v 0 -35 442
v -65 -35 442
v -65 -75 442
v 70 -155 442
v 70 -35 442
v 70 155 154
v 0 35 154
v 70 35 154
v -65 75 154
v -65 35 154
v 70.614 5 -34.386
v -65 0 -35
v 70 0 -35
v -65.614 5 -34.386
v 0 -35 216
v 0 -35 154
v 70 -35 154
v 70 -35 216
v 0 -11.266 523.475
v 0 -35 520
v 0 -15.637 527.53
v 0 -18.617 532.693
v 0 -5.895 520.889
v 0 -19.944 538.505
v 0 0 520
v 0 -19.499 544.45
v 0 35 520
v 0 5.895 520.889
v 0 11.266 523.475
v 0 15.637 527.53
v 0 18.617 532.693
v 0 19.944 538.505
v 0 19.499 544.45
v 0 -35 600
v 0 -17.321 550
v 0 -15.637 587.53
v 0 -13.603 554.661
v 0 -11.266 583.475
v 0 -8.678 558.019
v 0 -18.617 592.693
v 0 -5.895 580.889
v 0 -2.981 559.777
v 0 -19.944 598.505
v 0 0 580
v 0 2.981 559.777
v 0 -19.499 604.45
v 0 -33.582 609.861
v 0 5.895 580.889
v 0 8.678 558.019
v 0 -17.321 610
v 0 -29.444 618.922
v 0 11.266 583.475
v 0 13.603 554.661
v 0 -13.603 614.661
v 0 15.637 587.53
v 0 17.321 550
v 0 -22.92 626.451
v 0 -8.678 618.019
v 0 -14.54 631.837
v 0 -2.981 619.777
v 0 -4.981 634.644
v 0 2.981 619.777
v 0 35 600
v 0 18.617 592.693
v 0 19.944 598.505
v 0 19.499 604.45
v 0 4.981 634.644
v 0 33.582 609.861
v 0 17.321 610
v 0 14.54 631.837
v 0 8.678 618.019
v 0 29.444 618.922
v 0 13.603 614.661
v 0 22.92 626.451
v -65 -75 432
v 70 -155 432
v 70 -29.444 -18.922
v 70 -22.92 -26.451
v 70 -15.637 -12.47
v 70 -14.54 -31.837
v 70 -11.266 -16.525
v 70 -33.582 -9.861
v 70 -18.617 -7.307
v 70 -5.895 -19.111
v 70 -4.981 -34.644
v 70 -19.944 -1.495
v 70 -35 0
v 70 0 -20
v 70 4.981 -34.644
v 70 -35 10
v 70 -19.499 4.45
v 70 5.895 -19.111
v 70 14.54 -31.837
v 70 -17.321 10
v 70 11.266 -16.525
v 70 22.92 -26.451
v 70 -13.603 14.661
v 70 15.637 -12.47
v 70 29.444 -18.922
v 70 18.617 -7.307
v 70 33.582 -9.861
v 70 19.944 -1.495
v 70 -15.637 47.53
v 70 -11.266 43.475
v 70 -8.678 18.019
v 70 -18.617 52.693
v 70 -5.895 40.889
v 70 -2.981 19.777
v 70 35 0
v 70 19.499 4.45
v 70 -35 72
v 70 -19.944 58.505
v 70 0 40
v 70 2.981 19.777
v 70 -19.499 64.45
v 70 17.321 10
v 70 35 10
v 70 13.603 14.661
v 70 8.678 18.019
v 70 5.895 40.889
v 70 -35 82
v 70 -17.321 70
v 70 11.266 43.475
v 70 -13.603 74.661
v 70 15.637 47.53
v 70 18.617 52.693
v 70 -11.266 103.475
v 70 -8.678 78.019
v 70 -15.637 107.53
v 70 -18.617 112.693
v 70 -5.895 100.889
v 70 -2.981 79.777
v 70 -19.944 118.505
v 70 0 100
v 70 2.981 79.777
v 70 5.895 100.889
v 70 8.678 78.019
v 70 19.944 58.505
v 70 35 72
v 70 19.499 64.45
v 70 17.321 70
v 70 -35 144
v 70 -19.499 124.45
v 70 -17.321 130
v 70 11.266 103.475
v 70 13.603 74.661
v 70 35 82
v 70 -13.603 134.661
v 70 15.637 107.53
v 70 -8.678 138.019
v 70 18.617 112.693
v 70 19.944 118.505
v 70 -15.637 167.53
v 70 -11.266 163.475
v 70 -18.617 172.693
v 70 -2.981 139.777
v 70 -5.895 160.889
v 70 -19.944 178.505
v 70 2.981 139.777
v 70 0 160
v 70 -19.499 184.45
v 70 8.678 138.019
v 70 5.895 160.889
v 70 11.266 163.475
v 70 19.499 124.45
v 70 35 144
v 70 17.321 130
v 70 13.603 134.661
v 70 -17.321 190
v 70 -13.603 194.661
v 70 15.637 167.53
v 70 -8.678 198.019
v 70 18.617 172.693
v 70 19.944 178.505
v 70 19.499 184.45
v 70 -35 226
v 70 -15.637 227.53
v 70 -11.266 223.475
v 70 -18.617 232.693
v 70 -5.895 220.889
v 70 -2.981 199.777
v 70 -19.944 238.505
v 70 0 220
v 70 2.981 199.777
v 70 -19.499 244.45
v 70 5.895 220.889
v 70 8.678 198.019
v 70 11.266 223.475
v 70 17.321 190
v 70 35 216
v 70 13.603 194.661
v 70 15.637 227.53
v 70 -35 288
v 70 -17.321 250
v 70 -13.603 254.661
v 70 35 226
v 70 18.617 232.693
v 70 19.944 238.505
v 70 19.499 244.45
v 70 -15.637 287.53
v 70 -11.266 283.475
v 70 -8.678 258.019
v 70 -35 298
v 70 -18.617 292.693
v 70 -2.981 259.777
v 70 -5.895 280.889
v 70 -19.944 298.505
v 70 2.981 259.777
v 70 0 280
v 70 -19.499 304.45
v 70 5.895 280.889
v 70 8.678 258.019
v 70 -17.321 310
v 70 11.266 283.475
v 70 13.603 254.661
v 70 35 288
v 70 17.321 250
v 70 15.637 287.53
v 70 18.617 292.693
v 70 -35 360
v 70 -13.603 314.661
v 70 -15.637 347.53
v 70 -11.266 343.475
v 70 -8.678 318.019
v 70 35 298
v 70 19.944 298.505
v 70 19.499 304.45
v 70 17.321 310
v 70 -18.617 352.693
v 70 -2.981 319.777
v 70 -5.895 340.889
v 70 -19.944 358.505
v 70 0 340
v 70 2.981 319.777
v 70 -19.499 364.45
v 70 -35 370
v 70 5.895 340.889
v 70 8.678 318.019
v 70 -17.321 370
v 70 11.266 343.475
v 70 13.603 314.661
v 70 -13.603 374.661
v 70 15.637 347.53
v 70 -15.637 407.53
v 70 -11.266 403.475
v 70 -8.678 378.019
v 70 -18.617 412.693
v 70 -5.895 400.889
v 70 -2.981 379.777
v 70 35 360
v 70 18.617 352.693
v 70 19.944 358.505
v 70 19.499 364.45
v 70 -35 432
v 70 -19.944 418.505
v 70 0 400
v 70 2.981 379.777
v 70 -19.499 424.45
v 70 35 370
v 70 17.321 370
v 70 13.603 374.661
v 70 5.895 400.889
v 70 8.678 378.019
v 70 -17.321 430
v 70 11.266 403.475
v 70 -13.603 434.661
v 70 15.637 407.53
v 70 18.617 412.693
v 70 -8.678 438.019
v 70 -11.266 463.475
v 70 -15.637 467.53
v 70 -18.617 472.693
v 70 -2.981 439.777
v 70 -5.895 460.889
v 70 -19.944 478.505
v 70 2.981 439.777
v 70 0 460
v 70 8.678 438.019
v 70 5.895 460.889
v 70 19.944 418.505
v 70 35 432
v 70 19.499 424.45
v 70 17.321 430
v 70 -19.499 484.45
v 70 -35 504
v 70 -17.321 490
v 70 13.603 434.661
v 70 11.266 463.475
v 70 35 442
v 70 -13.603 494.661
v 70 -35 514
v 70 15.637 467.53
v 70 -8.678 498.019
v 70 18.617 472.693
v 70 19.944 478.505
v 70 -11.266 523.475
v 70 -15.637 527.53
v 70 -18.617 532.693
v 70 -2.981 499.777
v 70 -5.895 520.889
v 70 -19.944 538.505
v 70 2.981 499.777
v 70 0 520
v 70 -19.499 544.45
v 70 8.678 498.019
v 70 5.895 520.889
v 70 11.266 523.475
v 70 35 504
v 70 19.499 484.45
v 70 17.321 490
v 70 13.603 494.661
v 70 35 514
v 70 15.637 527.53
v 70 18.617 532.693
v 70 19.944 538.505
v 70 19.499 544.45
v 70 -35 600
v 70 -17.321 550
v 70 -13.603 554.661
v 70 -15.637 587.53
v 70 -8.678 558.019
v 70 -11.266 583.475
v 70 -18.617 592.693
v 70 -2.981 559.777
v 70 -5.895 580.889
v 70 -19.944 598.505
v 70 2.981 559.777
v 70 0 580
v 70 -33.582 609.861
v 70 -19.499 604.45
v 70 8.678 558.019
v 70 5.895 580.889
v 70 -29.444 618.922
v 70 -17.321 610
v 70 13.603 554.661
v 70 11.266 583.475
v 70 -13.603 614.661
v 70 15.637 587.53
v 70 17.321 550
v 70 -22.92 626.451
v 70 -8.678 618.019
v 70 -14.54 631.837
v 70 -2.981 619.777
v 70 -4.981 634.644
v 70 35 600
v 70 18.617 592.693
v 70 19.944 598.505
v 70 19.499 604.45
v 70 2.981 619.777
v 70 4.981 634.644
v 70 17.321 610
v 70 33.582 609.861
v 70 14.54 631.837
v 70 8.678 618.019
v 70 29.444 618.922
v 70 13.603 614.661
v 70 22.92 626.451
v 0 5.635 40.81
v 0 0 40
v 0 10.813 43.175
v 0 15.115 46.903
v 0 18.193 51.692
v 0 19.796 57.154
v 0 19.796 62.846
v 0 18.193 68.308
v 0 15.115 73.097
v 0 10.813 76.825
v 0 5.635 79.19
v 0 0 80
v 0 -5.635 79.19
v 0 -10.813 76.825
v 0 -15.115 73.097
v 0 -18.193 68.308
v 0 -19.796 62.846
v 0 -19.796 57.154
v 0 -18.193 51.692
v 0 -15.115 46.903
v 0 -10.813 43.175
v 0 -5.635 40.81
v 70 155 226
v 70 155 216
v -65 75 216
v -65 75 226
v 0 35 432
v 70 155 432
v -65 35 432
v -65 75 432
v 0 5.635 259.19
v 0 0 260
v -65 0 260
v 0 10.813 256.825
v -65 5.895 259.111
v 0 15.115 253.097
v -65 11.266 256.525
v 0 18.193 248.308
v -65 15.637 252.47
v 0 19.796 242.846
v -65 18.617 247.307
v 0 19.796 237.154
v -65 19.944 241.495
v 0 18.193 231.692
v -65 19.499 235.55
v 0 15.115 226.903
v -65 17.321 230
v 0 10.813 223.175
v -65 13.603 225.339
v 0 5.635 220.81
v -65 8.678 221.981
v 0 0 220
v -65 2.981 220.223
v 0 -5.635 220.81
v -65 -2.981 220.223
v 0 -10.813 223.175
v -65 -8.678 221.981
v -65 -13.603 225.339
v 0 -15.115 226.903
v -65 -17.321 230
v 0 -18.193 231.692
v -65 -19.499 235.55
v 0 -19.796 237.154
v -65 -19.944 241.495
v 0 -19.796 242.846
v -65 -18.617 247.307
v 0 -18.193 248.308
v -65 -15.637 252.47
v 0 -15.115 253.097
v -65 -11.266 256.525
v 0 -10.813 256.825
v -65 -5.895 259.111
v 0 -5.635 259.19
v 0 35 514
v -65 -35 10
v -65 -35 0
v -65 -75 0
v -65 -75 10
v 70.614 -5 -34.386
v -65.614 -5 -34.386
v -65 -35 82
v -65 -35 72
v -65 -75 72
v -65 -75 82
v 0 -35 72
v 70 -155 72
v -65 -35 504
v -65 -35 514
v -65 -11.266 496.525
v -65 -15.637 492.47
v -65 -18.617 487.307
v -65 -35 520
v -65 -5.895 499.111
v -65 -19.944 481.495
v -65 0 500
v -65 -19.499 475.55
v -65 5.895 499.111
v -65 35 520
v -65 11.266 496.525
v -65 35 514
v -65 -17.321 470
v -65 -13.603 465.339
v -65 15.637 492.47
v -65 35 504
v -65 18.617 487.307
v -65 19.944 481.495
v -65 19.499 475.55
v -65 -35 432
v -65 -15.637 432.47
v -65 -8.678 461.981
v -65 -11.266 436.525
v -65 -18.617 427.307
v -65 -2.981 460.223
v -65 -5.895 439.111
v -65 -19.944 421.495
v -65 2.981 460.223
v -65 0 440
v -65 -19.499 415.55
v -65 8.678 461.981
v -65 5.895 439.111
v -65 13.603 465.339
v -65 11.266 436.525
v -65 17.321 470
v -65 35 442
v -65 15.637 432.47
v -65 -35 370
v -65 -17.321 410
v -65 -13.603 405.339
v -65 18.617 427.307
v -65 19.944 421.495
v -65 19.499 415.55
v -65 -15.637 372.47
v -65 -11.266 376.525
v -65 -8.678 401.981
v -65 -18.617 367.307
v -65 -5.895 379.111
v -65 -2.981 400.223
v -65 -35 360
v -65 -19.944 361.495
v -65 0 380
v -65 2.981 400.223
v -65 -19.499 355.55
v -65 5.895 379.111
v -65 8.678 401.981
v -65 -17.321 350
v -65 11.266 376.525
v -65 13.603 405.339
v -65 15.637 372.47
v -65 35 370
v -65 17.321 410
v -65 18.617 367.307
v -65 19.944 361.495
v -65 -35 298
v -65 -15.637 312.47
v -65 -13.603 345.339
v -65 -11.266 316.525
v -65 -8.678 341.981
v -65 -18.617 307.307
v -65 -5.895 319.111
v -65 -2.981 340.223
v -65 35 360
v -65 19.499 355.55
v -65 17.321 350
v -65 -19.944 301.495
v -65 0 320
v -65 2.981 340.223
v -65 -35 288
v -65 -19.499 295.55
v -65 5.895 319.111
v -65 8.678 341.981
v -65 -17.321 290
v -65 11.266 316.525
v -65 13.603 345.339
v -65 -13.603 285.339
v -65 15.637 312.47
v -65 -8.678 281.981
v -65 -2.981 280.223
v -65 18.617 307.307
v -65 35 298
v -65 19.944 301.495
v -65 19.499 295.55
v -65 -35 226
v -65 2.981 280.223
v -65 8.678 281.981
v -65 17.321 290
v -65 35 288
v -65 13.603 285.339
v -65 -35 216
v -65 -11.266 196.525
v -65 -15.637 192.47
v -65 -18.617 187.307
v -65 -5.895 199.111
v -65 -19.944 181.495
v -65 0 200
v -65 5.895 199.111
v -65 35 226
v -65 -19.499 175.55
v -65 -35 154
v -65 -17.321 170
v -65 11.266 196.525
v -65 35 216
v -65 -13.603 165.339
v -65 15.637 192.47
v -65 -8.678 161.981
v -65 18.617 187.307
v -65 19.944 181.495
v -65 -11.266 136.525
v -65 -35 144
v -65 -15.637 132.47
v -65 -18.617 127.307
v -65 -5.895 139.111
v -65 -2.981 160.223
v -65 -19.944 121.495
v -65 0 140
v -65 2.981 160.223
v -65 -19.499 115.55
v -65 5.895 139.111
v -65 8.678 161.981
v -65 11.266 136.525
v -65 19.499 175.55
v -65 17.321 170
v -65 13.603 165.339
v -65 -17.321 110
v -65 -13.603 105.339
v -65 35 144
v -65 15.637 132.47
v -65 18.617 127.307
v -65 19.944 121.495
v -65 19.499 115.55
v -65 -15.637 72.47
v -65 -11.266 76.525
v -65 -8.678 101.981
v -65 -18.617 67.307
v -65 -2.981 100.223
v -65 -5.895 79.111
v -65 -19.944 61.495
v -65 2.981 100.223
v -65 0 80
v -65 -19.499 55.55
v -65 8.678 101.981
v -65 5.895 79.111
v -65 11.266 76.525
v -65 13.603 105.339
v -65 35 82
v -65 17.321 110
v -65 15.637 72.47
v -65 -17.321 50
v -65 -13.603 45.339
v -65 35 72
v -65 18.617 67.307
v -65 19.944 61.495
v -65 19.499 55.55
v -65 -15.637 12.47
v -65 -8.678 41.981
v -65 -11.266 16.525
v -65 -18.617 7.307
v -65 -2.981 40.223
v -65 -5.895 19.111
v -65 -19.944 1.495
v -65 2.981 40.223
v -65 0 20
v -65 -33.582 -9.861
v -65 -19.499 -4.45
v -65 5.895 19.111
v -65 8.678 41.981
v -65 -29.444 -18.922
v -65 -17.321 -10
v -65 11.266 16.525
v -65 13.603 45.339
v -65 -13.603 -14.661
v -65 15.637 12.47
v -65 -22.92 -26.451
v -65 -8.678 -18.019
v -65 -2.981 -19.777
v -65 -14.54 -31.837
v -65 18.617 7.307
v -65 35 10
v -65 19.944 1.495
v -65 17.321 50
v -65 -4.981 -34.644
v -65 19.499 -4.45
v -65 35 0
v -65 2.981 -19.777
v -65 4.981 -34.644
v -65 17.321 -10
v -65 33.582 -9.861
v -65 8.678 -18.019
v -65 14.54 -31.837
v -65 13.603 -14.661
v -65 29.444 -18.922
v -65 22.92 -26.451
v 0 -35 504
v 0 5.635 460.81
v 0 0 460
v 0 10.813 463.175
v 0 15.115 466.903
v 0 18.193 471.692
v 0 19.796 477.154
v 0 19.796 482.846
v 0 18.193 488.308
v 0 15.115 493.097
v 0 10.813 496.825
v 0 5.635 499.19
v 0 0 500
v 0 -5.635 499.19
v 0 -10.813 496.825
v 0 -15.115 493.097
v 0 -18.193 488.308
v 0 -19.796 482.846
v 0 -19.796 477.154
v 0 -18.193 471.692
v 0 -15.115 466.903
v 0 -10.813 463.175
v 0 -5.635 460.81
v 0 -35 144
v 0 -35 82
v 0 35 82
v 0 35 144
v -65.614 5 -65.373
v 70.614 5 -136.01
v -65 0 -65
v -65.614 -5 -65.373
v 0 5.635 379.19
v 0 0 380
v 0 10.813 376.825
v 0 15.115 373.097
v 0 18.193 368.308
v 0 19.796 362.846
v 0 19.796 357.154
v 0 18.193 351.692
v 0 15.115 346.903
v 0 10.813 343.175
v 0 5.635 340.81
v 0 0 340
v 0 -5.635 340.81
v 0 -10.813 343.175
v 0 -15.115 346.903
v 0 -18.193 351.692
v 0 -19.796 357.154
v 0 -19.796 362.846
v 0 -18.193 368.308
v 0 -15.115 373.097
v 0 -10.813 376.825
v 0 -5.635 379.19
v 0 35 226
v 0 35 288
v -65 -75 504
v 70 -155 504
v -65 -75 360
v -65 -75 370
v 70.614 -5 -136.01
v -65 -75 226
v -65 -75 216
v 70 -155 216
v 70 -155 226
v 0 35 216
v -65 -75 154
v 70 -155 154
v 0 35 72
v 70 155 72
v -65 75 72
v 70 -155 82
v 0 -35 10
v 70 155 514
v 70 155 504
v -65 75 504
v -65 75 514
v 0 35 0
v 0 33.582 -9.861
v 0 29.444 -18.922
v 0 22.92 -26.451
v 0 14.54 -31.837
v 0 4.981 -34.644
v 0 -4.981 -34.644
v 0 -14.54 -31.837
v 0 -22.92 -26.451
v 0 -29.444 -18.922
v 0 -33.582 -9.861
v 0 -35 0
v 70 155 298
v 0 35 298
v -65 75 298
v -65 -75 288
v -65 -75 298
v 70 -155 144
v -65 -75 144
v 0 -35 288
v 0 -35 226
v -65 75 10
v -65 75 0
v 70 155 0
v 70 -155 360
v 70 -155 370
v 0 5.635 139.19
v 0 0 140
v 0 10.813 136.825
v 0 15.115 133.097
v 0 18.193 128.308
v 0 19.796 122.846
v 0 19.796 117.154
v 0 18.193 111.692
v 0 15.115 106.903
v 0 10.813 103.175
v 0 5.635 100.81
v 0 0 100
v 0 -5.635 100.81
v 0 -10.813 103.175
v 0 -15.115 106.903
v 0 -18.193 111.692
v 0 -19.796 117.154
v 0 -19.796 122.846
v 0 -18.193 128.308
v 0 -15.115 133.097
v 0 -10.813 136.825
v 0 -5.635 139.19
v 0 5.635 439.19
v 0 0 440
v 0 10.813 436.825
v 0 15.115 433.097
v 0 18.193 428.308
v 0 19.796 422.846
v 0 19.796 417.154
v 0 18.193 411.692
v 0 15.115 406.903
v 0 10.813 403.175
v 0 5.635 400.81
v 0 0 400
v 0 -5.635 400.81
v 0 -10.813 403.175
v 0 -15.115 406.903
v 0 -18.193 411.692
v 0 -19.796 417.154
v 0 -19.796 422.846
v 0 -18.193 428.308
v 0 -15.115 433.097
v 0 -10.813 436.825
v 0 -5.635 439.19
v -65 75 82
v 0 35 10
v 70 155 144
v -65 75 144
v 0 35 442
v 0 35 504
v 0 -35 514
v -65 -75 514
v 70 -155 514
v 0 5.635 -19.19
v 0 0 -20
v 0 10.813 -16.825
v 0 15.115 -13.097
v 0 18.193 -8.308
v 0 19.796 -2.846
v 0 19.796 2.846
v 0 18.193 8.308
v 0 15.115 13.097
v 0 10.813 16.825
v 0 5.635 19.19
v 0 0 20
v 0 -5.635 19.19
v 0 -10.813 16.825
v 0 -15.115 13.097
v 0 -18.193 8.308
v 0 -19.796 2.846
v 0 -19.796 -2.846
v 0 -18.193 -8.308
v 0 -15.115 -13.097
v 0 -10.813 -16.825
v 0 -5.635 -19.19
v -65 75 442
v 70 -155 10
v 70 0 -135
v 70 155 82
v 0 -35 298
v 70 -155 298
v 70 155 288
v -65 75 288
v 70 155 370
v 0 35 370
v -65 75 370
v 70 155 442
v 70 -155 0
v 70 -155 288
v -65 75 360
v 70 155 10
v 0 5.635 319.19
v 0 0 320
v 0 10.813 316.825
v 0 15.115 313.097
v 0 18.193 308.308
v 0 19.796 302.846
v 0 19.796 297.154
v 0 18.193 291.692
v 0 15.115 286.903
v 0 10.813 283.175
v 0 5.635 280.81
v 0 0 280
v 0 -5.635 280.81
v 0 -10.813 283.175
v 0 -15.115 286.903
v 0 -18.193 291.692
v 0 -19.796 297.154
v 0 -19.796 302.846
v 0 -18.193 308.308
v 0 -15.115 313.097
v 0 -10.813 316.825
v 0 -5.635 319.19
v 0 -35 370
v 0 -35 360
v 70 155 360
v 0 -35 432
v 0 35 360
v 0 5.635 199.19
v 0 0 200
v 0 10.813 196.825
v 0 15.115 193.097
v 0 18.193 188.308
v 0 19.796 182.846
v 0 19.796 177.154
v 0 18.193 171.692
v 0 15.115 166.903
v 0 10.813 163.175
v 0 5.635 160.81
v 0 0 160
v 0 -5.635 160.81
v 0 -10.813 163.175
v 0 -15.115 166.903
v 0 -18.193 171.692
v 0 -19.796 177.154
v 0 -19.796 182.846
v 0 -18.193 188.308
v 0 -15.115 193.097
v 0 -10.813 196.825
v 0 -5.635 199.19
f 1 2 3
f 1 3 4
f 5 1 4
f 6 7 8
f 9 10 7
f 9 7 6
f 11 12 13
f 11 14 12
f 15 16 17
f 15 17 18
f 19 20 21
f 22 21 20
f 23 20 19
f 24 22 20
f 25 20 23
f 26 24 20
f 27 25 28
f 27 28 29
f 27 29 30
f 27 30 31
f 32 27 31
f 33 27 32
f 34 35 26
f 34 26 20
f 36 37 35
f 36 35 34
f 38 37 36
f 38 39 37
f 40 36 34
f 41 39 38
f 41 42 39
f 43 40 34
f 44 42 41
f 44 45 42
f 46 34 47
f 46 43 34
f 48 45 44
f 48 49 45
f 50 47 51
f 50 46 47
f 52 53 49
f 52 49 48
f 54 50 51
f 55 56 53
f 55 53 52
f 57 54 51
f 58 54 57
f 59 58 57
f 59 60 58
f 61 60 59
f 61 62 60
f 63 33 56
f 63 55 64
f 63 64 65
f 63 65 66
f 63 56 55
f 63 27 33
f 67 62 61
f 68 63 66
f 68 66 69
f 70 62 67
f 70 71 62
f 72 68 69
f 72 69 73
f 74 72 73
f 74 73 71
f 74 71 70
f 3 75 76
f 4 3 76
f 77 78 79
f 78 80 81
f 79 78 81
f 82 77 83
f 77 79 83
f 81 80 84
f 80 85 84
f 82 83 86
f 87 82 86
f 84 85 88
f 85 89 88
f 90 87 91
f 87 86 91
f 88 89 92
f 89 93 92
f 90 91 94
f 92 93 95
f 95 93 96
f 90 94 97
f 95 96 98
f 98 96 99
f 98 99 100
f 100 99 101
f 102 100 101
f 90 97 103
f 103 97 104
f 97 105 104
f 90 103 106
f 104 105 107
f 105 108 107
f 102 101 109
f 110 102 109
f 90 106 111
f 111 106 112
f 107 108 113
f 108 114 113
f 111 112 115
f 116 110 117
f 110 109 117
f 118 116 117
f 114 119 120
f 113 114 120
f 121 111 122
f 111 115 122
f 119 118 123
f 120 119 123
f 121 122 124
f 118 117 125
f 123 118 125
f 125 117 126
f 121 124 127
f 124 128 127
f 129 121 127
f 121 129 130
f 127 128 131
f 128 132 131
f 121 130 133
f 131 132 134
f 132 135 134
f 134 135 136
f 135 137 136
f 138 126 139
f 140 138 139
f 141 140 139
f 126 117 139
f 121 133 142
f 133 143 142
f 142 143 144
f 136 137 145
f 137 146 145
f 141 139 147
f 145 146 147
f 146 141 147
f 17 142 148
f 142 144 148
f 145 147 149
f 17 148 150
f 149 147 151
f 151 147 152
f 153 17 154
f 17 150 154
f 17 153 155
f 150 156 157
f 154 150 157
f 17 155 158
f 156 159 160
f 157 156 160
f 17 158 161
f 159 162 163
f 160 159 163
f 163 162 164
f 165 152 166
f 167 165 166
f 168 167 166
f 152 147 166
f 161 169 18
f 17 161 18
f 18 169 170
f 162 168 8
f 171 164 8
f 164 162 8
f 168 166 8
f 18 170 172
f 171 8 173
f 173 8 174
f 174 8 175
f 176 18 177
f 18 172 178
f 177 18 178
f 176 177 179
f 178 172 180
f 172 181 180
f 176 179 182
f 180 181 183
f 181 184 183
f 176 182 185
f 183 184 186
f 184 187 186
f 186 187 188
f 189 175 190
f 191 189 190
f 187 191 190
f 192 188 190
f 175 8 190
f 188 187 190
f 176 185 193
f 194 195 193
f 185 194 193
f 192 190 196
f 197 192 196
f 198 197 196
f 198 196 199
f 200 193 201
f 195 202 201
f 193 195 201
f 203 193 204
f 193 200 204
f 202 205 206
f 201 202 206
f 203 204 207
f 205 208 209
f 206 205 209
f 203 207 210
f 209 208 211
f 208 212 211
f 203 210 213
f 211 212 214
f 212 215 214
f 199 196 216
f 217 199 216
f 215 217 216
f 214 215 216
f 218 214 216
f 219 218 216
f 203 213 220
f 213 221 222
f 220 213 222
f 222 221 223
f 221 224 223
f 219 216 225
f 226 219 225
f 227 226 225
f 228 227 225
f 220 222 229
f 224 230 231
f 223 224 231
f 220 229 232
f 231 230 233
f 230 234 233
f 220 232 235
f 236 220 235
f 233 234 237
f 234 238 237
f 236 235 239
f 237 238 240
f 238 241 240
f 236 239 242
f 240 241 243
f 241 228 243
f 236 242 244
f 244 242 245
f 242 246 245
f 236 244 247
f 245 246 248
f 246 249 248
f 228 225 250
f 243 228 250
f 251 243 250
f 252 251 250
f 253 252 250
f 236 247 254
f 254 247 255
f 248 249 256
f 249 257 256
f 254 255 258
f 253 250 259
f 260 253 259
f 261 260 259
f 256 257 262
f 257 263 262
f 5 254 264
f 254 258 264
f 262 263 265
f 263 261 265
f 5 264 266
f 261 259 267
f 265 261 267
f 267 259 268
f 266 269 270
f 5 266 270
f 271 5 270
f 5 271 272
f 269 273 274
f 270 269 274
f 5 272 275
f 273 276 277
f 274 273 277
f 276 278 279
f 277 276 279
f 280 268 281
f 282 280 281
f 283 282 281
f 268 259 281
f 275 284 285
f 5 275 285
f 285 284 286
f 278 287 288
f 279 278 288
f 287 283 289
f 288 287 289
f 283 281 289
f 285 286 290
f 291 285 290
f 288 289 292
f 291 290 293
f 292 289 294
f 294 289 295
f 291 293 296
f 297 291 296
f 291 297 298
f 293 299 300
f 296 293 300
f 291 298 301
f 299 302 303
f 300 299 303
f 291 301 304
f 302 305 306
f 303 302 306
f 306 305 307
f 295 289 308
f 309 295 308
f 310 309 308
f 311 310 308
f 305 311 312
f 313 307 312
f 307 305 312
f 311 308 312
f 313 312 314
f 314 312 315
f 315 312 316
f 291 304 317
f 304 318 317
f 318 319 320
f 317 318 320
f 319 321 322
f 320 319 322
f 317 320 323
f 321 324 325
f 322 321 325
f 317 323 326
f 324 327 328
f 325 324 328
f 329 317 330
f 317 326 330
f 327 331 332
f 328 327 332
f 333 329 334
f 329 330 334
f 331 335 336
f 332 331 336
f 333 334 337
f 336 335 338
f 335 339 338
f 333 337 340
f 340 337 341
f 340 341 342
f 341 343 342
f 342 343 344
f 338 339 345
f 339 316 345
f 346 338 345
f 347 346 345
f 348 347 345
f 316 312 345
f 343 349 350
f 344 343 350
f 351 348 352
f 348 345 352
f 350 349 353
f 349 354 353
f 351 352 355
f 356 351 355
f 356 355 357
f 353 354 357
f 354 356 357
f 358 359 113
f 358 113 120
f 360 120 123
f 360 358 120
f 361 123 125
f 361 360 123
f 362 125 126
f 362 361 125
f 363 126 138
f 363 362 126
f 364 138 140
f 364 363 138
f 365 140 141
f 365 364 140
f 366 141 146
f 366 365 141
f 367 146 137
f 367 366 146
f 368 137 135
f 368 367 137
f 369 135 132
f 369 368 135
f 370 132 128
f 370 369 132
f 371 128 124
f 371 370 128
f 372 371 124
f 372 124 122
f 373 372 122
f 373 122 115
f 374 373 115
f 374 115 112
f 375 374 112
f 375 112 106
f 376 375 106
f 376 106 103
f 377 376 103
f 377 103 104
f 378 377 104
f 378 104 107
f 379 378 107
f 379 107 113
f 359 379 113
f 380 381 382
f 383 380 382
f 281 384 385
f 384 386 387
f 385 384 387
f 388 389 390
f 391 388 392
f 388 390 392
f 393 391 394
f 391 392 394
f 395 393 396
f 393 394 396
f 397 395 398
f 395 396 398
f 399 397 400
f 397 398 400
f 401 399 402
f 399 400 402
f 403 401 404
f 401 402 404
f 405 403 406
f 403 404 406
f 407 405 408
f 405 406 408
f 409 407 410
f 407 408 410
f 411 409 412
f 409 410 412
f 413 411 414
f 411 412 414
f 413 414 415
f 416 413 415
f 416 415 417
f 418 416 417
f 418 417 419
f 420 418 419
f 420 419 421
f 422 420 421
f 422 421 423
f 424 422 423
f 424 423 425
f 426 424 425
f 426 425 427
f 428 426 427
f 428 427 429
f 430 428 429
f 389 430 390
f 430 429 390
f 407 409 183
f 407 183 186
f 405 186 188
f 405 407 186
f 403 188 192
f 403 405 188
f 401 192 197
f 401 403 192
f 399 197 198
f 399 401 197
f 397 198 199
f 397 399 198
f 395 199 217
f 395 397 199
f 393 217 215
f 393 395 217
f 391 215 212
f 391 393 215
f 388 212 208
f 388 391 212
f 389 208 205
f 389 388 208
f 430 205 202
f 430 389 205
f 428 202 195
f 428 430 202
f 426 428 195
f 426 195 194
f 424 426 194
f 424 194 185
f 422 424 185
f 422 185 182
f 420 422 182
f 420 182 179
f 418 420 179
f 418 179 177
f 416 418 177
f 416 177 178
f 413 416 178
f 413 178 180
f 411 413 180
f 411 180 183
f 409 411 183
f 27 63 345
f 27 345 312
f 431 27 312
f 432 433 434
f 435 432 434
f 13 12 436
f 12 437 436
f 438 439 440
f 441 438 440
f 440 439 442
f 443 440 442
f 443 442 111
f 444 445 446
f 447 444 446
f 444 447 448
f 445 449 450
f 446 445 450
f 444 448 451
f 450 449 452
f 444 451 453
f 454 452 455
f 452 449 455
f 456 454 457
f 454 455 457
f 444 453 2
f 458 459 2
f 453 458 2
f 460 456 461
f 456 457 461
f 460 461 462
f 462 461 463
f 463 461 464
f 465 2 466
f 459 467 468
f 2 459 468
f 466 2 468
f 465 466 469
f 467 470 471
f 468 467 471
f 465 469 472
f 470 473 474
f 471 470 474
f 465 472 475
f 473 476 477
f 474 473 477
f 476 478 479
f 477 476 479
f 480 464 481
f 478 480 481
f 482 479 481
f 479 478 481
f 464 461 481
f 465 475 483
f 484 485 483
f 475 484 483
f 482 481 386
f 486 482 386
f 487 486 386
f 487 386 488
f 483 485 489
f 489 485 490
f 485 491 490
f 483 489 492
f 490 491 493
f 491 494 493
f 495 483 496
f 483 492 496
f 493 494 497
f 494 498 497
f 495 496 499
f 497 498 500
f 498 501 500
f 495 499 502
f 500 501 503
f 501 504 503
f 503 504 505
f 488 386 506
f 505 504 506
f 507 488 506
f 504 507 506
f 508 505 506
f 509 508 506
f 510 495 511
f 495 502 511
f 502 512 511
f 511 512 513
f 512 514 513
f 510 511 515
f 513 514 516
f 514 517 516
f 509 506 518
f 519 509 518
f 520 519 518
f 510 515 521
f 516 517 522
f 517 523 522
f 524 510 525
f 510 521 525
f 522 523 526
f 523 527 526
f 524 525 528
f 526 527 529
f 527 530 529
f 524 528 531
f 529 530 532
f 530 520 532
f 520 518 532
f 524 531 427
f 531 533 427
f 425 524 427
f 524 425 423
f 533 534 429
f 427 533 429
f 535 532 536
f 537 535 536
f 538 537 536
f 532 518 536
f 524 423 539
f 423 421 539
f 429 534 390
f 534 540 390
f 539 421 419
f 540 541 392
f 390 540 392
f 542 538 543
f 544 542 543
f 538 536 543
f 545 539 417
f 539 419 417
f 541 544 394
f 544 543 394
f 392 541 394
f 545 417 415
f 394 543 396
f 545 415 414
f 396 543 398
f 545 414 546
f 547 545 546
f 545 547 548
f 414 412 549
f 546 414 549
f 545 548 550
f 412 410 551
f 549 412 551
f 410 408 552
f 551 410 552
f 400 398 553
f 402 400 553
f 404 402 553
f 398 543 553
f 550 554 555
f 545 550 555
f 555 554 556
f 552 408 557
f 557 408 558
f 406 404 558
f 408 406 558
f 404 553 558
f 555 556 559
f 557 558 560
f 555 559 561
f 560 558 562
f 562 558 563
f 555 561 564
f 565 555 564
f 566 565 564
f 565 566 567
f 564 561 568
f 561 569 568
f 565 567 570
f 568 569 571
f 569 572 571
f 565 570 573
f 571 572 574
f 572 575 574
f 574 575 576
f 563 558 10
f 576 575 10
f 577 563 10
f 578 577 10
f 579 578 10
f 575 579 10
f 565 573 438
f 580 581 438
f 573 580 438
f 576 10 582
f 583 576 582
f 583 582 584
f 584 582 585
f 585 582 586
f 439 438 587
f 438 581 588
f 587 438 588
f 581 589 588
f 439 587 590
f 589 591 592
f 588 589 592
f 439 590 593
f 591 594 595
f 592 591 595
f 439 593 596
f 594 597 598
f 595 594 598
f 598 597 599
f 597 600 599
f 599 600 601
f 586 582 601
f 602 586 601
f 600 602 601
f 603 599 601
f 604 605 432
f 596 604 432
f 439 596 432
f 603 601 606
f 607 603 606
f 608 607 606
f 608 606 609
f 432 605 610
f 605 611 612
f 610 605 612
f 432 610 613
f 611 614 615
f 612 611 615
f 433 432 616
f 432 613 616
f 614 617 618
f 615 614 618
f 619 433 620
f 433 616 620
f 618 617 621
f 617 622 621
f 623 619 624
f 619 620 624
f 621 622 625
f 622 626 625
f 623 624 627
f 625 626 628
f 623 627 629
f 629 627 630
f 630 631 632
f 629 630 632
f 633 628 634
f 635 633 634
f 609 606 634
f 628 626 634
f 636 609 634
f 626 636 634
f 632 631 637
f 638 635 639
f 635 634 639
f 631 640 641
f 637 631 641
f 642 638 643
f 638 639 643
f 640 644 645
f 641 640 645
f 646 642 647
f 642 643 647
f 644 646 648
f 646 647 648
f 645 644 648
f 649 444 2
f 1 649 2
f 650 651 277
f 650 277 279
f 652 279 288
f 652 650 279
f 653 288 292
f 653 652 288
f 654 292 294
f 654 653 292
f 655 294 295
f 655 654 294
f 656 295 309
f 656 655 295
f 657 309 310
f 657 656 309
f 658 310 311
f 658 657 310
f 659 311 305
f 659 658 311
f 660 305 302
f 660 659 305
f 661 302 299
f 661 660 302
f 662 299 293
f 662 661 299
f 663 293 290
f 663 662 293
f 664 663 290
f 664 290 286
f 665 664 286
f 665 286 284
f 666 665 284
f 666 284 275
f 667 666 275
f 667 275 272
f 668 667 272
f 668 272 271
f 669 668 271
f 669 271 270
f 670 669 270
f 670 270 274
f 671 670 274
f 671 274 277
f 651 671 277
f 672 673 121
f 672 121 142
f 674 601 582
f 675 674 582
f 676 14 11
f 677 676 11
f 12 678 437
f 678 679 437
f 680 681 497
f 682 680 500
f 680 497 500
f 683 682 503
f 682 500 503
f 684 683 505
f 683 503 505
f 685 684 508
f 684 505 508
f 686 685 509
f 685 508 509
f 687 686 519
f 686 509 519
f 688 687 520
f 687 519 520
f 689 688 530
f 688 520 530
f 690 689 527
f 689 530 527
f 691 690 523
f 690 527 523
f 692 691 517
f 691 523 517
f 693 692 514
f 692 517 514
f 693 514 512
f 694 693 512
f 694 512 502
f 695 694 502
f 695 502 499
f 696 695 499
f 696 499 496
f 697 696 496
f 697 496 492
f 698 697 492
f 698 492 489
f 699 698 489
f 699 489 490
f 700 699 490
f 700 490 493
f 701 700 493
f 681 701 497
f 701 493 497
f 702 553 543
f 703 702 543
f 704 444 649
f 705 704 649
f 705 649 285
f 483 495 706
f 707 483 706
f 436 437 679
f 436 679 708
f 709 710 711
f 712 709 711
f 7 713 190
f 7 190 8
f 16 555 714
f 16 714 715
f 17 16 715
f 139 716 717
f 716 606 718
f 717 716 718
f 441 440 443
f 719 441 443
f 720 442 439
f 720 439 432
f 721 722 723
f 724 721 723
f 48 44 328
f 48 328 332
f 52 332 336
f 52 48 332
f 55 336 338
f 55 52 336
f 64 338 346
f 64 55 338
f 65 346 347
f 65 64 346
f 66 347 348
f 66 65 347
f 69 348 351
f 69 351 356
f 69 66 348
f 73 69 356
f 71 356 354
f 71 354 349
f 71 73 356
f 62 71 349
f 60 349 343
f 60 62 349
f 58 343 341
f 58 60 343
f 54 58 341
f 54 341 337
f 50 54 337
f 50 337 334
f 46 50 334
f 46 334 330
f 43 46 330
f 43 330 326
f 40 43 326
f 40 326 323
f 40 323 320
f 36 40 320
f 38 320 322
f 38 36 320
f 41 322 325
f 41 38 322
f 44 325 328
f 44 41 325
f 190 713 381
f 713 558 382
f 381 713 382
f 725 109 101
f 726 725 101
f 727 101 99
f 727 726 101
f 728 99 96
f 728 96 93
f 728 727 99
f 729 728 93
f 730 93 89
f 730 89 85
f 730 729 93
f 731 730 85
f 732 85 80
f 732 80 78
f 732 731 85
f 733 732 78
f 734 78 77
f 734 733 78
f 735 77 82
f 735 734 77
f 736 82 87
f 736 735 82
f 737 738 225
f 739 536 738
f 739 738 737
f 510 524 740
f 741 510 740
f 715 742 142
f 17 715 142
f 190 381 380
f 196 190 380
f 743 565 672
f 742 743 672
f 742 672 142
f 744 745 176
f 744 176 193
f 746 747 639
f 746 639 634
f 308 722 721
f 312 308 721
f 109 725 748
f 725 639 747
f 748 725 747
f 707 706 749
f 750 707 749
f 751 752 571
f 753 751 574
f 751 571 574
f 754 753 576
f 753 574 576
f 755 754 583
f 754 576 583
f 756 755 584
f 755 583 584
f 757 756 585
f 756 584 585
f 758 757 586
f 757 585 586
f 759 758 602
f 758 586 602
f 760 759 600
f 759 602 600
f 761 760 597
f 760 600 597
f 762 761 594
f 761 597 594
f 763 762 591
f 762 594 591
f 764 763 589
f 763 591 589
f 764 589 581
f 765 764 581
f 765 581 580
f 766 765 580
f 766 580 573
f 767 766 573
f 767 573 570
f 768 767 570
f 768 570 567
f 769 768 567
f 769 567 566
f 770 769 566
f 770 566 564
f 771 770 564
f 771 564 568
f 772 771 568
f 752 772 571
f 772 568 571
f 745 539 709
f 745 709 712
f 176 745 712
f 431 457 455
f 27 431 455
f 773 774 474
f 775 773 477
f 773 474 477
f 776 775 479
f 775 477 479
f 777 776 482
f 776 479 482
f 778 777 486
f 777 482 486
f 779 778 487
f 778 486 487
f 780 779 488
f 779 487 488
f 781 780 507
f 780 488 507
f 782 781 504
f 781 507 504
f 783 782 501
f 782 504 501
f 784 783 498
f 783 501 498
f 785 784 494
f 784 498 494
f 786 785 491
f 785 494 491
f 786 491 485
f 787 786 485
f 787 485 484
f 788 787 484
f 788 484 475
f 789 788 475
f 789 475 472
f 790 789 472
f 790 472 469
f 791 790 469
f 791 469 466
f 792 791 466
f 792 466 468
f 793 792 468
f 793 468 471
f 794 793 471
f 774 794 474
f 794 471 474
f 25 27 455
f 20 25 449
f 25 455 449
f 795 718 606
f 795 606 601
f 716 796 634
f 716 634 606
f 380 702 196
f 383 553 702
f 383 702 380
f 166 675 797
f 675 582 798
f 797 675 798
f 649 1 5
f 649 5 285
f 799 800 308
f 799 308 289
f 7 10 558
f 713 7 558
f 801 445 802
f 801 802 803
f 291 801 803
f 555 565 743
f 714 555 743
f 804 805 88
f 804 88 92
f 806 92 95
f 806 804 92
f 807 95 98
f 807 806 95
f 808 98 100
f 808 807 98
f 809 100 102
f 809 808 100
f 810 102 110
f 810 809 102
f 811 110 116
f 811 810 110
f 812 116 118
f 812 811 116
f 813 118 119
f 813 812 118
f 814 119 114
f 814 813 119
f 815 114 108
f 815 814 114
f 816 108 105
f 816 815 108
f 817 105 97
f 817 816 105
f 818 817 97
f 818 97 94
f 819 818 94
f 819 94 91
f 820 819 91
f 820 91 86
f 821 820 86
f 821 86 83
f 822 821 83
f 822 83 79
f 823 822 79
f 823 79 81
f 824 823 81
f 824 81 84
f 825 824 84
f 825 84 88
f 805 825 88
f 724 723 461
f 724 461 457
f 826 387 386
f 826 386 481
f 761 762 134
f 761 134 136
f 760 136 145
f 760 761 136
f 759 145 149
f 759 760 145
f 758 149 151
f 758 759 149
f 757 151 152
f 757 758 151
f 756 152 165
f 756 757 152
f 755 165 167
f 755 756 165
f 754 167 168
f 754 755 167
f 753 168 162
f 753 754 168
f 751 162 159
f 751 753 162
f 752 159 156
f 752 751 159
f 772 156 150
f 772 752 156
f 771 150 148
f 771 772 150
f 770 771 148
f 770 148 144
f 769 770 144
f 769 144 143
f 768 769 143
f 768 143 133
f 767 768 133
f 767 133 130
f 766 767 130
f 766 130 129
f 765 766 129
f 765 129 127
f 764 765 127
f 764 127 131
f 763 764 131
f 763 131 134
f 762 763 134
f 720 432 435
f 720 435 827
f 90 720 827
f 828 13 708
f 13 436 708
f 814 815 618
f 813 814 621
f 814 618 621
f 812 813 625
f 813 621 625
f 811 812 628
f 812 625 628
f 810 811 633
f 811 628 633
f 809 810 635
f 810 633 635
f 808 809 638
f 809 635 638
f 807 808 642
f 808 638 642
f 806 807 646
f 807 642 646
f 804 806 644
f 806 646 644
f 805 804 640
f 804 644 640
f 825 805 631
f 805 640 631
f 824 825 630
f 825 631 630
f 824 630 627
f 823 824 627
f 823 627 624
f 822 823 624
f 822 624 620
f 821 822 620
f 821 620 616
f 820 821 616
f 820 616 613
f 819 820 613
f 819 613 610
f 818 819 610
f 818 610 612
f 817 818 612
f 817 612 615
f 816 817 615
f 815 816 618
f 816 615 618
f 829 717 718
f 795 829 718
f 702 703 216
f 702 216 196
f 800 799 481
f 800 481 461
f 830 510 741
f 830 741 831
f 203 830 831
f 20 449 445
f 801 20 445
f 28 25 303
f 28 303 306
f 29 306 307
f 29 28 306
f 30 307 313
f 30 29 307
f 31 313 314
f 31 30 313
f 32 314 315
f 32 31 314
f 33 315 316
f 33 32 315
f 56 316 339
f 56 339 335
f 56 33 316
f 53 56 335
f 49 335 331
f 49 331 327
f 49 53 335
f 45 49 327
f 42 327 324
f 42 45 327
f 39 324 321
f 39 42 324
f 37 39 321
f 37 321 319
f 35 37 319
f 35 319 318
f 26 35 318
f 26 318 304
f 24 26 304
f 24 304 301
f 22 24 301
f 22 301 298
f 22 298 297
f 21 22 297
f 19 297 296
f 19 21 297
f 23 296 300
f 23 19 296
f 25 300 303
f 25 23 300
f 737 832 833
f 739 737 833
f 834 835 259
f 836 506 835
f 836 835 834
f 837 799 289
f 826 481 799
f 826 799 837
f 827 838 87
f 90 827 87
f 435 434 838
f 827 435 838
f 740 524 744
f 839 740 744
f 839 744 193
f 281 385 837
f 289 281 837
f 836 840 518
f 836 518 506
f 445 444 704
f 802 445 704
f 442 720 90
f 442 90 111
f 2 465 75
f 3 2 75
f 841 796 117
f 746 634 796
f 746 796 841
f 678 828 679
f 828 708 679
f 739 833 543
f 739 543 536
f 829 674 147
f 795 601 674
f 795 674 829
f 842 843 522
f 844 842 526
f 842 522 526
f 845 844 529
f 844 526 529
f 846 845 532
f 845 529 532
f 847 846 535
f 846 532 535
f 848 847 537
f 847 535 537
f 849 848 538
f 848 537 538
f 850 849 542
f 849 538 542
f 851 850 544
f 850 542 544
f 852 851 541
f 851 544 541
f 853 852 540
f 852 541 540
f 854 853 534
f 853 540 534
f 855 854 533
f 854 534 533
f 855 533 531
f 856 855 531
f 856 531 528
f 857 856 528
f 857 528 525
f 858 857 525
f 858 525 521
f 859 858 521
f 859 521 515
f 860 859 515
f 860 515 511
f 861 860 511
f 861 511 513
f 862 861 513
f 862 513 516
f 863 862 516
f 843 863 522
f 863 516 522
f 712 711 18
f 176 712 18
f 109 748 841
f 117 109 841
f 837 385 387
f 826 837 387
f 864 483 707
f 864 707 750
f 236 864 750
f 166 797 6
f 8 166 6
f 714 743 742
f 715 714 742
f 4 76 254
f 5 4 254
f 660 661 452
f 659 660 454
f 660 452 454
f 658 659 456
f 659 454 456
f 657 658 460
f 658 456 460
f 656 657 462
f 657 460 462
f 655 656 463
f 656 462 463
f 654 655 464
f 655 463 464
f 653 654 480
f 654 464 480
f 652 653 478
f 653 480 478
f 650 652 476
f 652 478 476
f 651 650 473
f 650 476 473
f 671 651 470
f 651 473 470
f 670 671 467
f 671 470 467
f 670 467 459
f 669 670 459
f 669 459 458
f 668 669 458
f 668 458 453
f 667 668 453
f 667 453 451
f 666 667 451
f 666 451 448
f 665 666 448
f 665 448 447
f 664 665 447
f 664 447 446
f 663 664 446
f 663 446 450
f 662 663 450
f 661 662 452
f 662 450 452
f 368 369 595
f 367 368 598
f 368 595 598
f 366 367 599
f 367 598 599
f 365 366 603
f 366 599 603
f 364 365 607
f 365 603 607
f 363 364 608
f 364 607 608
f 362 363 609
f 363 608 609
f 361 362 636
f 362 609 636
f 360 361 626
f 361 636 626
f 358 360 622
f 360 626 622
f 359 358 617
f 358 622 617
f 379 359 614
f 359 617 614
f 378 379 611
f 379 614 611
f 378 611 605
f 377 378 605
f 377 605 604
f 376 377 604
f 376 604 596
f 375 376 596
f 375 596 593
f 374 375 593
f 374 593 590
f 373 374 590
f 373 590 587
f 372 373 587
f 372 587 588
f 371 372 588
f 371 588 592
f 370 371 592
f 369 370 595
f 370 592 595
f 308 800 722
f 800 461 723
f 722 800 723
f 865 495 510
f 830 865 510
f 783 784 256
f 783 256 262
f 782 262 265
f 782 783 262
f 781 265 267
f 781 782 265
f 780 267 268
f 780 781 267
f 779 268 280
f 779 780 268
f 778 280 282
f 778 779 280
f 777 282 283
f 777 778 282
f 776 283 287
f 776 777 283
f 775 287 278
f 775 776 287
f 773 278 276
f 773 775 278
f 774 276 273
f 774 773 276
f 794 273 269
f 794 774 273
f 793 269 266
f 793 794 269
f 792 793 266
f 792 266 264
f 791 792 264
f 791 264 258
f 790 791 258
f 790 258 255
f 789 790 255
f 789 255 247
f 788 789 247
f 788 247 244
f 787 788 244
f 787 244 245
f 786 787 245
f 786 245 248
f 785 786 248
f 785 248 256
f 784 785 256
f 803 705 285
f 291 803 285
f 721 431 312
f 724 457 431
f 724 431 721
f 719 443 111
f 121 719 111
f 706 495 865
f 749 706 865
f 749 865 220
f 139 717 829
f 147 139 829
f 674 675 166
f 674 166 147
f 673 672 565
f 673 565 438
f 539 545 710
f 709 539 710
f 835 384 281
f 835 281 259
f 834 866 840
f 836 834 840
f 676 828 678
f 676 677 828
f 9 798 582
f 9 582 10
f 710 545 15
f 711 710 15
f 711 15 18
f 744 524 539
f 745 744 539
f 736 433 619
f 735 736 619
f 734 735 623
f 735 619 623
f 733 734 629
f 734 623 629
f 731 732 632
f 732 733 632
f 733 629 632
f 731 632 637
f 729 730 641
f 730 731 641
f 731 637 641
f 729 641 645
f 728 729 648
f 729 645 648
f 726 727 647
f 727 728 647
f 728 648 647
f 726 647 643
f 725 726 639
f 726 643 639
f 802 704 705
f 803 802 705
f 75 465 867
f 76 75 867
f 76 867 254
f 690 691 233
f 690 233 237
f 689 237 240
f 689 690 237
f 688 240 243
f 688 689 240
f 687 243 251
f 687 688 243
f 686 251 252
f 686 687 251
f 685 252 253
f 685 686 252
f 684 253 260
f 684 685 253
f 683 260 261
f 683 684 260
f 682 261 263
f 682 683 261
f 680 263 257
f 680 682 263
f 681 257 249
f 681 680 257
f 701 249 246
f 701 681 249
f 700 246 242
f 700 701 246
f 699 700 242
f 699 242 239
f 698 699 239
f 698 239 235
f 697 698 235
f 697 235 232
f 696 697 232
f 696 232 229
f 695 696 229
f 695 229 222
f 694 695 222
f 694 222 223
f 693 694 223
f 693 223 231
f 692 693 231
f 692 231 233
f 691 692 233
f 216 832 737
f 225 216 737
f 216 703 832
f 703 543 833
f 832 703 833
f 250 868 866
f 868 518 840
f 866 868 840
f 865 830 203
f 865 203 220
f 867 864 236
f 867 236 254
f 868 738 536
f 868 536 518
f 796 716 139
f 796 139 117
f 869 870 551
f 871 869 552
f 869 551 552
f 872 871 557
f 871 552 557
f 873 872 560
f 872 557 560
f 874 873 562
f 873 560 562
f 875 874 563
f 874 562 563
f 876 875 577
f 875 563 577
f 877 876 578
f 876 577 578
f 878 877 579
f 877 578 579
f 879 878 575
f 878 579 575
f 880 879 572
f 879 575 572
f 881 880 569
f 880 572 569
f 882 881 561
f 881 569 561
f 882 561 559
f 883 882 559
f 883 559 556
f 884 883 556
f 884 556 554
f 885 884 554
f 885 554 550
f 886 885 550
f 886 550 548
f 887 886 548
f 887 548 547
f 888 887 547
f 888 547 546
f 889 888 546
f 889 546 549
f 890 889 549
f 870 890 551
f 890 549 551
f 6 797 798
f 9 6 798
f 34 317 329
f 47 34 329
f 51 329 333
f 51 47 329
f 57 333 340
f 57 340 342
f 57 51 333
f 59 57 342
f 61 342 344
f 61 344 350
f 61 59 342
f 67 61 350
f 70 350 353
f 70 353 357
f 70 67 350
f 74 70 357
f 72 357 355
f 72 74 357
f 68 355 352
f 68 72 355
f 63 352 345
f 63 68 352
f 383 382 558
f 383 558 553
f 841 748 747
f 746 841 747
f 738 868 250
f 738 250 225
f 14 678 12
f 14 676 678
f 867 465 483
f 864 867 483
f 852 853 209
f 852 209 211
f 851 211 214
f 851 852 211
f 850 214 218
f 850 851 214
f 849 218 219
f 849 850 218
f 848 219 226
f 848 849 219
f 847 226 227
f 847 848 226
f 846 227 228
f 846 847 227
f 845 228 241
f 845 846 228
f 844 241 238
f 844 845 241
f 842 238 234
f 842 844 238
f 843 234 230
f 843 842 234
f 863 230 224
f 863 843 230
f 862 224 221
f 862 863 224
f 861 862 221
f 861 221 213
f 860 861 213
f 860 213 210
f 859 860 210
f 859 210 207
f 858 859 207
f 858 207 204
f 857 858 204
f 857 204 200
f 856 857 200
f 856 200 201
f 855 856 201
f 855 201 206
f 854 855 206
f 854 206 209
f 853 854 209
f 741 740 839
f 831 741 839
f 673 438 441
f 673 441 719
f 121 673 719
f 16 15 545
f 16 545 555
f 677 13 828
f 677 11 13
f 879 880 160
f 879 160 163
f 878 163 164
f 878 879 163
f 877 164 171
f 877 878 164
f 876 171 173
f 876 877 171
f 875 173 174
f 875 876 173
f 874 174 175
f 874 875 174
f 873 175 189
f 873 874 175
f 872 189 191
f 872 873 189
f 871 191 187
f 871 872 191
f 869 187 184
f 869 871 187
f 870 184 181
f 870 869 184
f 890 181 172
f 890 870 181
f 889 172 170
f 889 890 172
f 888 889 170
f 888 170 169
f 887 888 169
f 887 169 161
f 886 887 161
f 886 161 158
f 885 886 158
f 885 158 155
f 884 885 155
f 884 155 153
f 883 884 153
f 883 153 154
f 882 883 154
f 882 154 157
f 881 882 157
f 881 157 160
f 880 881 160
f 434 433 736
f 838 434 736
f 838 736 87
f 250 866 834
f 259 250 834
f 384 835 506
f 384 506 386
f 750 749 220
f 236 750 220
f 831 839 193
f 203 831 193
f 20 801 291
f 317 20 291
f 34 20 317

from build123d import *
from build123d.topology import SkipClean

# Parameters (mm, degrees)
SKETCH1_R                     = 20
BOSS_EXTRUDE1_DEPTH           = 70
BOSS_EXTRUDE2_START           = 65
SKETCH2_R                     = 20
BOSS_EXTRUDE2_DEPTH           = 65
SKETCH3_W                     = 10
SKETCH3_H                     = 120
BOSS_EXTRUDE3_DEPTH           = 135
CUT_EXTRUDE1_DEPTH            = 658.381167969
LPATTERN1_COUNT               = 8
LPATTERN1_PITCH               = 72
MIRROR1_DEPTH                 = 10
MIRROR1_START                 = 72
MIRROR1_2_DEPTH               = 10
MIRROR1_START_2               = 144
MIRROR1_3_DEPTH               = 10
MIRROR1_START_3               = 216
MIRROR1_4_DEPTH               = 10
MIRROR1_START_4               = 288
MIRROR1_5_DEPTH               = 10
MIRROR1_START_5               = 360
MIRROR1_6_DEPTH               = 10
MIRROR1_START_6               = 432
MIRROR1_7_DEPTH               = 10
MIRROR1_START_7               = 504
MIRROR1_8_DEPTH               = 10
BOSS_EXTRUDE4_DEPTH           = 5
BOSS_EXTRUDE4_TAPER           = -7
BOSS_EXTRUDE4_OTHER_WAY_DEPTH = 5
BOSS_EXTRUDE4_OTHER_WAY_TAPER = -7


# Read off the part's stored shape, not the designer's step: Mirror1
with BuildPart() as part:
    # Sketch1 → Boss-Extrude1 (new body)
    with BuildSketch(Plane(origin=(0, 0, 0), x_dir=(0, 0, -1), z_dir=(1, 0, 0))):
        with BuildLine():
            Line((0, -35), (-600, -35))
            ThreePointArc((-600, -35), (-635, 0), (-600, 35))
            Line((-600, 35), (0, 35))
            ThreePointArc((0, 35), (35, 0), (0, -35))
        make_face()
        with Locations((-600, 0)):
            Circle(SKETCH1_R, mode=Mode.SUBTRACT)
        with Locations((-540, 0)):
            Circle(SKETCH1_R, mode=Mode.SUBTRACT)
        with Locations((-480, 0)):
            Circle(SKETCH1_R, mode=Mode.SUBTRACT)
        with Locations((-420, 0)):
            Circle(SKETCH1_R, mode=Mode.SUBTRACT)
        with Locations((-360, 0)):
            Circle(SKETCH1_R, mode=Mode.SUBTRACT)
        with Locations((-300, 0)):
            Circle(SKETCH1_R, mode=Mode.SUBTRACT)
        with Locations((-240, 0)):
            Circle(SKETCH1_R, mode=Mode.SUBTRACT)
        with Locations((-180, 0)):
            Circle(SKETCH1_R, mode=Mode.SUBTRACT)
        with Locations((-120, 0)):
            Circle(SKETCH1_R, mode=Mode.SUBTRACT)
        with Locations((-60, 0)):
            Circle(SKETCH1_R, mode=Mode.SUBTRACT)
        Circle(SKETCH1_R, mode=Mode.SUBTRACT)
    extrude(amount=BOSS_EXTRUDE1_DEPTH)

    # Sketch2 → Boss-Extrude2 (add)
    with SkipClean():  # the faces are left unmerged after this step: merging them gives an invalid solid
        with BuildSketch(Plane.ZY.offset(BOSS_EXTRUDE2_START)):
            with BuildLine():
                Line((520, -35), (0, -35))
                ThreePointArc((0, -35), (-35, 0), (0, 35))
                Line((0, 35), (520, 35))
                Line((520, 35), (520, -35))
            make_face()
            with Locations((480, 0)):
                Circle(SKETCH2_R, mode=Mode.SUBTRACT)
            with Locations((420, 0)):
                Circle(SKETCH2_R, mode=Mode.SUBTRACT)
            with Locations((360, 0)):
                Circle(SKETCH2_R, mode=Mode.SUBTRACT)
            with Locations((300, 0)):
                Circle(SKETCH2_R, mode=Mode.SUBTRACT)
            with Locations((240, 0)):
                Circle(SKETCH2_R, mode=Mode.SUBTRACT)
            with Locations((180, 0)):
                Circle(SKETCH2_R, mode=Mode.SUBTRACT)
            with Locations((120, 0)):
                Circle(SKETCH2_R, mode=Mode.SUBTRACT)
            with Locations((60, 0)):
                Circle(SKETCH2_R, mode=Mode.SUBTRACT)
            Circle(SKETCH2_R, mode=Mode.SUBTRACT)
        extrude(amount=-BOSS_EXTRUDE2_DEPTH)

    # Sketch3 → Boss-Extrude3 (add)
    with SkipClean():  # the faces are left unmerged after this step: merging them gives an invalid solid
        with BuildSketch(Plane.ZY.offset(65)):
            with Locations((5, 95)):
                Rectangle(SKETCH3_W, SKETCH3_H)
        boss_extrude3 = extrude(amount=-BOSS_EXTRUDE3_DEPTH)

    # Sketch4 → Cut-Extrude1 (cut, through all)
    with SkipClean():  # the faces are left unmerged after this step: merging them gives an invalid solid
        with BuildSketch(Plane(origin=(0, 0, 0), x_dir=(-1, 0, 0), z_dir=(0, 0, -1))):
            Polygon((-70, 155), (65, 75), (65, 155), align=None)
        cut_extrude1 = extrude(amount=-CUT_EXTRUDE1_DEPTH, mode=Mode.SUBTRACT)

    # LPattern1: Boss-Extrude3, Cut-Extrude1 ×8
    with SkipClean():  # the faces are left unmerged after this step: merging them gives an invalid solid
        with Locations(*[(0, 0, i * LPATTERN1_PITCH) for i in range(1, LPATTERN1_COUNT)]):
            add(boss_extrude3)
            add(cut_extrude1, mode=Mode.SUBTRACT)

    # Mirror1 outline → Mirror1 (add)
    with SkipClean():  # the faces are left unmerged after this step: merging them gives an invalid solid
        with BuildSketch(Plane.XY):
            Polygon((70, -35), (-65, -35), (-65, -75), (70, -155), align=None)
        extrude(amount=MIRROR1_DEPTH)

    # Mirror1 2 outline → Mirror1 2 (add)
    with SkipClean():  # the faces are left unmerged after this step: merging them gives an invalid solid
        with BuildSketch(Plane.XY.offset(MIRROR1_START)):
            Polygon((70, -35), (-65, -35), (-65, -75), (70, -155), align=None)
        extrude(amount=MIRROR1_2_DEPTH)

    # Mirror1 3 outline → Mirror1 3 (add)
    with SkipClean():  # the faces are left unmerged after this step: merging them gives an invalid solid
        with BuildSketch(Plane.XY.offset(MIRROR1_START_2)):
            Polygon((70, -35), (-65, -35), (-65, -75), (70, -155), align=None)
        extrude(amount=MIRROR1_3_DEPTH)

    # Mirror1 4 outline → Mirror1 4 (add)
    with SkipClean():  # the faces are left unmerged after this step: merging them gives an invalid solid
        with BuildSketch(Plane.XY.offset(MIRROR1_START_3)):
            Polygon((70, -35), (-65, -35), (-65, -75), (70, -155), align=None)
        extrude(amount=MIRROR1_4_DEPTH)

    # Mirror1 5 outline → Mirror1 5 (add)
    with SkipClean():  # the faces are left unmerged after this step: merging them gives an invalid solid
        with BuildSketch(Plane.XY.offset(MIRROR1_START_4)):
            Polygon((70, -35), (-65, -35), (-65, -75), (70, -155), align=None)
        extrude(amount=MIRROR1_5_DEPTH)

    # Mirror1 6 outline → Mirror1 6 (add)
    with SkipClean():  # the faces are left unmerged after this step: merging them gives an invalid solid
        with BuildSketch(Plane.XY.offset(MIRROR1_START_5)):
            Polygon((70, -35), (-65, -35), (-65, -75), (70, -155), align=None)
        extrude(amount=MIRROR1_6_DEPTH)

    # Mirror1 7 outline → Mirror1 7 (add)
    with SkipClean():  # the faces are left unmerged after this step: merging them gives an invalid solid
        with BuildSketch(Plane.XY.offset(MIRROR1_START_6)):
            Polygon((70, -35), (-65, -35), (-65, -75), (70, -155), align=None)
        extrude(amount=MIRROR1_7_DEPTH)

    # Mirror1 8 outline → Mirror1 8 (add)
    with SkipClean():  # the faces are left unmerged after this step: merging them gives an invalid solid
        with BuildSketch(Plane.XY.offset(MIRROR1_START_7)):
            Polygon((70, -35), (-65, -35), (-65, -75), (70, -155), align=None)
        extrude(amount=MIRROR1_8_DEPTH)


with BuildPart() as body_2:
    # Sketch5 → Boss-Extrude4 (new body)
    with BuildSketch(Plane(origin=(0, 0, 0), x_dir=(1, 0, 0), z_dir=(0, 1, 0))):
        Polygon((-65, 35), (70, 35), (70, 135), (-65, 65), align=None)
    extrude(amount=BOSS_EXTRUDE4_DEPTH, taper=BOSS_EXTRUDE4_TAPER)

    # Sketch5 → Boss-Extrude4 other way (add)
    with BuildSketch(Plane(origin=(0, 0, 0), x_dir=(1, 0, 0), z_dir=(0, 1, 0))):
        Polygon((-65, 35), (70, 35), (70, 135), (-65, 65), align=None)
    extrude(amount=-BOSS_EXTRUDE4_OTHER_WAY_DEPTH, taper=BOSS_EXTRUDE4_OTHER_WAY_TAPER)


solid = Compound([part.part, body_2.part])
